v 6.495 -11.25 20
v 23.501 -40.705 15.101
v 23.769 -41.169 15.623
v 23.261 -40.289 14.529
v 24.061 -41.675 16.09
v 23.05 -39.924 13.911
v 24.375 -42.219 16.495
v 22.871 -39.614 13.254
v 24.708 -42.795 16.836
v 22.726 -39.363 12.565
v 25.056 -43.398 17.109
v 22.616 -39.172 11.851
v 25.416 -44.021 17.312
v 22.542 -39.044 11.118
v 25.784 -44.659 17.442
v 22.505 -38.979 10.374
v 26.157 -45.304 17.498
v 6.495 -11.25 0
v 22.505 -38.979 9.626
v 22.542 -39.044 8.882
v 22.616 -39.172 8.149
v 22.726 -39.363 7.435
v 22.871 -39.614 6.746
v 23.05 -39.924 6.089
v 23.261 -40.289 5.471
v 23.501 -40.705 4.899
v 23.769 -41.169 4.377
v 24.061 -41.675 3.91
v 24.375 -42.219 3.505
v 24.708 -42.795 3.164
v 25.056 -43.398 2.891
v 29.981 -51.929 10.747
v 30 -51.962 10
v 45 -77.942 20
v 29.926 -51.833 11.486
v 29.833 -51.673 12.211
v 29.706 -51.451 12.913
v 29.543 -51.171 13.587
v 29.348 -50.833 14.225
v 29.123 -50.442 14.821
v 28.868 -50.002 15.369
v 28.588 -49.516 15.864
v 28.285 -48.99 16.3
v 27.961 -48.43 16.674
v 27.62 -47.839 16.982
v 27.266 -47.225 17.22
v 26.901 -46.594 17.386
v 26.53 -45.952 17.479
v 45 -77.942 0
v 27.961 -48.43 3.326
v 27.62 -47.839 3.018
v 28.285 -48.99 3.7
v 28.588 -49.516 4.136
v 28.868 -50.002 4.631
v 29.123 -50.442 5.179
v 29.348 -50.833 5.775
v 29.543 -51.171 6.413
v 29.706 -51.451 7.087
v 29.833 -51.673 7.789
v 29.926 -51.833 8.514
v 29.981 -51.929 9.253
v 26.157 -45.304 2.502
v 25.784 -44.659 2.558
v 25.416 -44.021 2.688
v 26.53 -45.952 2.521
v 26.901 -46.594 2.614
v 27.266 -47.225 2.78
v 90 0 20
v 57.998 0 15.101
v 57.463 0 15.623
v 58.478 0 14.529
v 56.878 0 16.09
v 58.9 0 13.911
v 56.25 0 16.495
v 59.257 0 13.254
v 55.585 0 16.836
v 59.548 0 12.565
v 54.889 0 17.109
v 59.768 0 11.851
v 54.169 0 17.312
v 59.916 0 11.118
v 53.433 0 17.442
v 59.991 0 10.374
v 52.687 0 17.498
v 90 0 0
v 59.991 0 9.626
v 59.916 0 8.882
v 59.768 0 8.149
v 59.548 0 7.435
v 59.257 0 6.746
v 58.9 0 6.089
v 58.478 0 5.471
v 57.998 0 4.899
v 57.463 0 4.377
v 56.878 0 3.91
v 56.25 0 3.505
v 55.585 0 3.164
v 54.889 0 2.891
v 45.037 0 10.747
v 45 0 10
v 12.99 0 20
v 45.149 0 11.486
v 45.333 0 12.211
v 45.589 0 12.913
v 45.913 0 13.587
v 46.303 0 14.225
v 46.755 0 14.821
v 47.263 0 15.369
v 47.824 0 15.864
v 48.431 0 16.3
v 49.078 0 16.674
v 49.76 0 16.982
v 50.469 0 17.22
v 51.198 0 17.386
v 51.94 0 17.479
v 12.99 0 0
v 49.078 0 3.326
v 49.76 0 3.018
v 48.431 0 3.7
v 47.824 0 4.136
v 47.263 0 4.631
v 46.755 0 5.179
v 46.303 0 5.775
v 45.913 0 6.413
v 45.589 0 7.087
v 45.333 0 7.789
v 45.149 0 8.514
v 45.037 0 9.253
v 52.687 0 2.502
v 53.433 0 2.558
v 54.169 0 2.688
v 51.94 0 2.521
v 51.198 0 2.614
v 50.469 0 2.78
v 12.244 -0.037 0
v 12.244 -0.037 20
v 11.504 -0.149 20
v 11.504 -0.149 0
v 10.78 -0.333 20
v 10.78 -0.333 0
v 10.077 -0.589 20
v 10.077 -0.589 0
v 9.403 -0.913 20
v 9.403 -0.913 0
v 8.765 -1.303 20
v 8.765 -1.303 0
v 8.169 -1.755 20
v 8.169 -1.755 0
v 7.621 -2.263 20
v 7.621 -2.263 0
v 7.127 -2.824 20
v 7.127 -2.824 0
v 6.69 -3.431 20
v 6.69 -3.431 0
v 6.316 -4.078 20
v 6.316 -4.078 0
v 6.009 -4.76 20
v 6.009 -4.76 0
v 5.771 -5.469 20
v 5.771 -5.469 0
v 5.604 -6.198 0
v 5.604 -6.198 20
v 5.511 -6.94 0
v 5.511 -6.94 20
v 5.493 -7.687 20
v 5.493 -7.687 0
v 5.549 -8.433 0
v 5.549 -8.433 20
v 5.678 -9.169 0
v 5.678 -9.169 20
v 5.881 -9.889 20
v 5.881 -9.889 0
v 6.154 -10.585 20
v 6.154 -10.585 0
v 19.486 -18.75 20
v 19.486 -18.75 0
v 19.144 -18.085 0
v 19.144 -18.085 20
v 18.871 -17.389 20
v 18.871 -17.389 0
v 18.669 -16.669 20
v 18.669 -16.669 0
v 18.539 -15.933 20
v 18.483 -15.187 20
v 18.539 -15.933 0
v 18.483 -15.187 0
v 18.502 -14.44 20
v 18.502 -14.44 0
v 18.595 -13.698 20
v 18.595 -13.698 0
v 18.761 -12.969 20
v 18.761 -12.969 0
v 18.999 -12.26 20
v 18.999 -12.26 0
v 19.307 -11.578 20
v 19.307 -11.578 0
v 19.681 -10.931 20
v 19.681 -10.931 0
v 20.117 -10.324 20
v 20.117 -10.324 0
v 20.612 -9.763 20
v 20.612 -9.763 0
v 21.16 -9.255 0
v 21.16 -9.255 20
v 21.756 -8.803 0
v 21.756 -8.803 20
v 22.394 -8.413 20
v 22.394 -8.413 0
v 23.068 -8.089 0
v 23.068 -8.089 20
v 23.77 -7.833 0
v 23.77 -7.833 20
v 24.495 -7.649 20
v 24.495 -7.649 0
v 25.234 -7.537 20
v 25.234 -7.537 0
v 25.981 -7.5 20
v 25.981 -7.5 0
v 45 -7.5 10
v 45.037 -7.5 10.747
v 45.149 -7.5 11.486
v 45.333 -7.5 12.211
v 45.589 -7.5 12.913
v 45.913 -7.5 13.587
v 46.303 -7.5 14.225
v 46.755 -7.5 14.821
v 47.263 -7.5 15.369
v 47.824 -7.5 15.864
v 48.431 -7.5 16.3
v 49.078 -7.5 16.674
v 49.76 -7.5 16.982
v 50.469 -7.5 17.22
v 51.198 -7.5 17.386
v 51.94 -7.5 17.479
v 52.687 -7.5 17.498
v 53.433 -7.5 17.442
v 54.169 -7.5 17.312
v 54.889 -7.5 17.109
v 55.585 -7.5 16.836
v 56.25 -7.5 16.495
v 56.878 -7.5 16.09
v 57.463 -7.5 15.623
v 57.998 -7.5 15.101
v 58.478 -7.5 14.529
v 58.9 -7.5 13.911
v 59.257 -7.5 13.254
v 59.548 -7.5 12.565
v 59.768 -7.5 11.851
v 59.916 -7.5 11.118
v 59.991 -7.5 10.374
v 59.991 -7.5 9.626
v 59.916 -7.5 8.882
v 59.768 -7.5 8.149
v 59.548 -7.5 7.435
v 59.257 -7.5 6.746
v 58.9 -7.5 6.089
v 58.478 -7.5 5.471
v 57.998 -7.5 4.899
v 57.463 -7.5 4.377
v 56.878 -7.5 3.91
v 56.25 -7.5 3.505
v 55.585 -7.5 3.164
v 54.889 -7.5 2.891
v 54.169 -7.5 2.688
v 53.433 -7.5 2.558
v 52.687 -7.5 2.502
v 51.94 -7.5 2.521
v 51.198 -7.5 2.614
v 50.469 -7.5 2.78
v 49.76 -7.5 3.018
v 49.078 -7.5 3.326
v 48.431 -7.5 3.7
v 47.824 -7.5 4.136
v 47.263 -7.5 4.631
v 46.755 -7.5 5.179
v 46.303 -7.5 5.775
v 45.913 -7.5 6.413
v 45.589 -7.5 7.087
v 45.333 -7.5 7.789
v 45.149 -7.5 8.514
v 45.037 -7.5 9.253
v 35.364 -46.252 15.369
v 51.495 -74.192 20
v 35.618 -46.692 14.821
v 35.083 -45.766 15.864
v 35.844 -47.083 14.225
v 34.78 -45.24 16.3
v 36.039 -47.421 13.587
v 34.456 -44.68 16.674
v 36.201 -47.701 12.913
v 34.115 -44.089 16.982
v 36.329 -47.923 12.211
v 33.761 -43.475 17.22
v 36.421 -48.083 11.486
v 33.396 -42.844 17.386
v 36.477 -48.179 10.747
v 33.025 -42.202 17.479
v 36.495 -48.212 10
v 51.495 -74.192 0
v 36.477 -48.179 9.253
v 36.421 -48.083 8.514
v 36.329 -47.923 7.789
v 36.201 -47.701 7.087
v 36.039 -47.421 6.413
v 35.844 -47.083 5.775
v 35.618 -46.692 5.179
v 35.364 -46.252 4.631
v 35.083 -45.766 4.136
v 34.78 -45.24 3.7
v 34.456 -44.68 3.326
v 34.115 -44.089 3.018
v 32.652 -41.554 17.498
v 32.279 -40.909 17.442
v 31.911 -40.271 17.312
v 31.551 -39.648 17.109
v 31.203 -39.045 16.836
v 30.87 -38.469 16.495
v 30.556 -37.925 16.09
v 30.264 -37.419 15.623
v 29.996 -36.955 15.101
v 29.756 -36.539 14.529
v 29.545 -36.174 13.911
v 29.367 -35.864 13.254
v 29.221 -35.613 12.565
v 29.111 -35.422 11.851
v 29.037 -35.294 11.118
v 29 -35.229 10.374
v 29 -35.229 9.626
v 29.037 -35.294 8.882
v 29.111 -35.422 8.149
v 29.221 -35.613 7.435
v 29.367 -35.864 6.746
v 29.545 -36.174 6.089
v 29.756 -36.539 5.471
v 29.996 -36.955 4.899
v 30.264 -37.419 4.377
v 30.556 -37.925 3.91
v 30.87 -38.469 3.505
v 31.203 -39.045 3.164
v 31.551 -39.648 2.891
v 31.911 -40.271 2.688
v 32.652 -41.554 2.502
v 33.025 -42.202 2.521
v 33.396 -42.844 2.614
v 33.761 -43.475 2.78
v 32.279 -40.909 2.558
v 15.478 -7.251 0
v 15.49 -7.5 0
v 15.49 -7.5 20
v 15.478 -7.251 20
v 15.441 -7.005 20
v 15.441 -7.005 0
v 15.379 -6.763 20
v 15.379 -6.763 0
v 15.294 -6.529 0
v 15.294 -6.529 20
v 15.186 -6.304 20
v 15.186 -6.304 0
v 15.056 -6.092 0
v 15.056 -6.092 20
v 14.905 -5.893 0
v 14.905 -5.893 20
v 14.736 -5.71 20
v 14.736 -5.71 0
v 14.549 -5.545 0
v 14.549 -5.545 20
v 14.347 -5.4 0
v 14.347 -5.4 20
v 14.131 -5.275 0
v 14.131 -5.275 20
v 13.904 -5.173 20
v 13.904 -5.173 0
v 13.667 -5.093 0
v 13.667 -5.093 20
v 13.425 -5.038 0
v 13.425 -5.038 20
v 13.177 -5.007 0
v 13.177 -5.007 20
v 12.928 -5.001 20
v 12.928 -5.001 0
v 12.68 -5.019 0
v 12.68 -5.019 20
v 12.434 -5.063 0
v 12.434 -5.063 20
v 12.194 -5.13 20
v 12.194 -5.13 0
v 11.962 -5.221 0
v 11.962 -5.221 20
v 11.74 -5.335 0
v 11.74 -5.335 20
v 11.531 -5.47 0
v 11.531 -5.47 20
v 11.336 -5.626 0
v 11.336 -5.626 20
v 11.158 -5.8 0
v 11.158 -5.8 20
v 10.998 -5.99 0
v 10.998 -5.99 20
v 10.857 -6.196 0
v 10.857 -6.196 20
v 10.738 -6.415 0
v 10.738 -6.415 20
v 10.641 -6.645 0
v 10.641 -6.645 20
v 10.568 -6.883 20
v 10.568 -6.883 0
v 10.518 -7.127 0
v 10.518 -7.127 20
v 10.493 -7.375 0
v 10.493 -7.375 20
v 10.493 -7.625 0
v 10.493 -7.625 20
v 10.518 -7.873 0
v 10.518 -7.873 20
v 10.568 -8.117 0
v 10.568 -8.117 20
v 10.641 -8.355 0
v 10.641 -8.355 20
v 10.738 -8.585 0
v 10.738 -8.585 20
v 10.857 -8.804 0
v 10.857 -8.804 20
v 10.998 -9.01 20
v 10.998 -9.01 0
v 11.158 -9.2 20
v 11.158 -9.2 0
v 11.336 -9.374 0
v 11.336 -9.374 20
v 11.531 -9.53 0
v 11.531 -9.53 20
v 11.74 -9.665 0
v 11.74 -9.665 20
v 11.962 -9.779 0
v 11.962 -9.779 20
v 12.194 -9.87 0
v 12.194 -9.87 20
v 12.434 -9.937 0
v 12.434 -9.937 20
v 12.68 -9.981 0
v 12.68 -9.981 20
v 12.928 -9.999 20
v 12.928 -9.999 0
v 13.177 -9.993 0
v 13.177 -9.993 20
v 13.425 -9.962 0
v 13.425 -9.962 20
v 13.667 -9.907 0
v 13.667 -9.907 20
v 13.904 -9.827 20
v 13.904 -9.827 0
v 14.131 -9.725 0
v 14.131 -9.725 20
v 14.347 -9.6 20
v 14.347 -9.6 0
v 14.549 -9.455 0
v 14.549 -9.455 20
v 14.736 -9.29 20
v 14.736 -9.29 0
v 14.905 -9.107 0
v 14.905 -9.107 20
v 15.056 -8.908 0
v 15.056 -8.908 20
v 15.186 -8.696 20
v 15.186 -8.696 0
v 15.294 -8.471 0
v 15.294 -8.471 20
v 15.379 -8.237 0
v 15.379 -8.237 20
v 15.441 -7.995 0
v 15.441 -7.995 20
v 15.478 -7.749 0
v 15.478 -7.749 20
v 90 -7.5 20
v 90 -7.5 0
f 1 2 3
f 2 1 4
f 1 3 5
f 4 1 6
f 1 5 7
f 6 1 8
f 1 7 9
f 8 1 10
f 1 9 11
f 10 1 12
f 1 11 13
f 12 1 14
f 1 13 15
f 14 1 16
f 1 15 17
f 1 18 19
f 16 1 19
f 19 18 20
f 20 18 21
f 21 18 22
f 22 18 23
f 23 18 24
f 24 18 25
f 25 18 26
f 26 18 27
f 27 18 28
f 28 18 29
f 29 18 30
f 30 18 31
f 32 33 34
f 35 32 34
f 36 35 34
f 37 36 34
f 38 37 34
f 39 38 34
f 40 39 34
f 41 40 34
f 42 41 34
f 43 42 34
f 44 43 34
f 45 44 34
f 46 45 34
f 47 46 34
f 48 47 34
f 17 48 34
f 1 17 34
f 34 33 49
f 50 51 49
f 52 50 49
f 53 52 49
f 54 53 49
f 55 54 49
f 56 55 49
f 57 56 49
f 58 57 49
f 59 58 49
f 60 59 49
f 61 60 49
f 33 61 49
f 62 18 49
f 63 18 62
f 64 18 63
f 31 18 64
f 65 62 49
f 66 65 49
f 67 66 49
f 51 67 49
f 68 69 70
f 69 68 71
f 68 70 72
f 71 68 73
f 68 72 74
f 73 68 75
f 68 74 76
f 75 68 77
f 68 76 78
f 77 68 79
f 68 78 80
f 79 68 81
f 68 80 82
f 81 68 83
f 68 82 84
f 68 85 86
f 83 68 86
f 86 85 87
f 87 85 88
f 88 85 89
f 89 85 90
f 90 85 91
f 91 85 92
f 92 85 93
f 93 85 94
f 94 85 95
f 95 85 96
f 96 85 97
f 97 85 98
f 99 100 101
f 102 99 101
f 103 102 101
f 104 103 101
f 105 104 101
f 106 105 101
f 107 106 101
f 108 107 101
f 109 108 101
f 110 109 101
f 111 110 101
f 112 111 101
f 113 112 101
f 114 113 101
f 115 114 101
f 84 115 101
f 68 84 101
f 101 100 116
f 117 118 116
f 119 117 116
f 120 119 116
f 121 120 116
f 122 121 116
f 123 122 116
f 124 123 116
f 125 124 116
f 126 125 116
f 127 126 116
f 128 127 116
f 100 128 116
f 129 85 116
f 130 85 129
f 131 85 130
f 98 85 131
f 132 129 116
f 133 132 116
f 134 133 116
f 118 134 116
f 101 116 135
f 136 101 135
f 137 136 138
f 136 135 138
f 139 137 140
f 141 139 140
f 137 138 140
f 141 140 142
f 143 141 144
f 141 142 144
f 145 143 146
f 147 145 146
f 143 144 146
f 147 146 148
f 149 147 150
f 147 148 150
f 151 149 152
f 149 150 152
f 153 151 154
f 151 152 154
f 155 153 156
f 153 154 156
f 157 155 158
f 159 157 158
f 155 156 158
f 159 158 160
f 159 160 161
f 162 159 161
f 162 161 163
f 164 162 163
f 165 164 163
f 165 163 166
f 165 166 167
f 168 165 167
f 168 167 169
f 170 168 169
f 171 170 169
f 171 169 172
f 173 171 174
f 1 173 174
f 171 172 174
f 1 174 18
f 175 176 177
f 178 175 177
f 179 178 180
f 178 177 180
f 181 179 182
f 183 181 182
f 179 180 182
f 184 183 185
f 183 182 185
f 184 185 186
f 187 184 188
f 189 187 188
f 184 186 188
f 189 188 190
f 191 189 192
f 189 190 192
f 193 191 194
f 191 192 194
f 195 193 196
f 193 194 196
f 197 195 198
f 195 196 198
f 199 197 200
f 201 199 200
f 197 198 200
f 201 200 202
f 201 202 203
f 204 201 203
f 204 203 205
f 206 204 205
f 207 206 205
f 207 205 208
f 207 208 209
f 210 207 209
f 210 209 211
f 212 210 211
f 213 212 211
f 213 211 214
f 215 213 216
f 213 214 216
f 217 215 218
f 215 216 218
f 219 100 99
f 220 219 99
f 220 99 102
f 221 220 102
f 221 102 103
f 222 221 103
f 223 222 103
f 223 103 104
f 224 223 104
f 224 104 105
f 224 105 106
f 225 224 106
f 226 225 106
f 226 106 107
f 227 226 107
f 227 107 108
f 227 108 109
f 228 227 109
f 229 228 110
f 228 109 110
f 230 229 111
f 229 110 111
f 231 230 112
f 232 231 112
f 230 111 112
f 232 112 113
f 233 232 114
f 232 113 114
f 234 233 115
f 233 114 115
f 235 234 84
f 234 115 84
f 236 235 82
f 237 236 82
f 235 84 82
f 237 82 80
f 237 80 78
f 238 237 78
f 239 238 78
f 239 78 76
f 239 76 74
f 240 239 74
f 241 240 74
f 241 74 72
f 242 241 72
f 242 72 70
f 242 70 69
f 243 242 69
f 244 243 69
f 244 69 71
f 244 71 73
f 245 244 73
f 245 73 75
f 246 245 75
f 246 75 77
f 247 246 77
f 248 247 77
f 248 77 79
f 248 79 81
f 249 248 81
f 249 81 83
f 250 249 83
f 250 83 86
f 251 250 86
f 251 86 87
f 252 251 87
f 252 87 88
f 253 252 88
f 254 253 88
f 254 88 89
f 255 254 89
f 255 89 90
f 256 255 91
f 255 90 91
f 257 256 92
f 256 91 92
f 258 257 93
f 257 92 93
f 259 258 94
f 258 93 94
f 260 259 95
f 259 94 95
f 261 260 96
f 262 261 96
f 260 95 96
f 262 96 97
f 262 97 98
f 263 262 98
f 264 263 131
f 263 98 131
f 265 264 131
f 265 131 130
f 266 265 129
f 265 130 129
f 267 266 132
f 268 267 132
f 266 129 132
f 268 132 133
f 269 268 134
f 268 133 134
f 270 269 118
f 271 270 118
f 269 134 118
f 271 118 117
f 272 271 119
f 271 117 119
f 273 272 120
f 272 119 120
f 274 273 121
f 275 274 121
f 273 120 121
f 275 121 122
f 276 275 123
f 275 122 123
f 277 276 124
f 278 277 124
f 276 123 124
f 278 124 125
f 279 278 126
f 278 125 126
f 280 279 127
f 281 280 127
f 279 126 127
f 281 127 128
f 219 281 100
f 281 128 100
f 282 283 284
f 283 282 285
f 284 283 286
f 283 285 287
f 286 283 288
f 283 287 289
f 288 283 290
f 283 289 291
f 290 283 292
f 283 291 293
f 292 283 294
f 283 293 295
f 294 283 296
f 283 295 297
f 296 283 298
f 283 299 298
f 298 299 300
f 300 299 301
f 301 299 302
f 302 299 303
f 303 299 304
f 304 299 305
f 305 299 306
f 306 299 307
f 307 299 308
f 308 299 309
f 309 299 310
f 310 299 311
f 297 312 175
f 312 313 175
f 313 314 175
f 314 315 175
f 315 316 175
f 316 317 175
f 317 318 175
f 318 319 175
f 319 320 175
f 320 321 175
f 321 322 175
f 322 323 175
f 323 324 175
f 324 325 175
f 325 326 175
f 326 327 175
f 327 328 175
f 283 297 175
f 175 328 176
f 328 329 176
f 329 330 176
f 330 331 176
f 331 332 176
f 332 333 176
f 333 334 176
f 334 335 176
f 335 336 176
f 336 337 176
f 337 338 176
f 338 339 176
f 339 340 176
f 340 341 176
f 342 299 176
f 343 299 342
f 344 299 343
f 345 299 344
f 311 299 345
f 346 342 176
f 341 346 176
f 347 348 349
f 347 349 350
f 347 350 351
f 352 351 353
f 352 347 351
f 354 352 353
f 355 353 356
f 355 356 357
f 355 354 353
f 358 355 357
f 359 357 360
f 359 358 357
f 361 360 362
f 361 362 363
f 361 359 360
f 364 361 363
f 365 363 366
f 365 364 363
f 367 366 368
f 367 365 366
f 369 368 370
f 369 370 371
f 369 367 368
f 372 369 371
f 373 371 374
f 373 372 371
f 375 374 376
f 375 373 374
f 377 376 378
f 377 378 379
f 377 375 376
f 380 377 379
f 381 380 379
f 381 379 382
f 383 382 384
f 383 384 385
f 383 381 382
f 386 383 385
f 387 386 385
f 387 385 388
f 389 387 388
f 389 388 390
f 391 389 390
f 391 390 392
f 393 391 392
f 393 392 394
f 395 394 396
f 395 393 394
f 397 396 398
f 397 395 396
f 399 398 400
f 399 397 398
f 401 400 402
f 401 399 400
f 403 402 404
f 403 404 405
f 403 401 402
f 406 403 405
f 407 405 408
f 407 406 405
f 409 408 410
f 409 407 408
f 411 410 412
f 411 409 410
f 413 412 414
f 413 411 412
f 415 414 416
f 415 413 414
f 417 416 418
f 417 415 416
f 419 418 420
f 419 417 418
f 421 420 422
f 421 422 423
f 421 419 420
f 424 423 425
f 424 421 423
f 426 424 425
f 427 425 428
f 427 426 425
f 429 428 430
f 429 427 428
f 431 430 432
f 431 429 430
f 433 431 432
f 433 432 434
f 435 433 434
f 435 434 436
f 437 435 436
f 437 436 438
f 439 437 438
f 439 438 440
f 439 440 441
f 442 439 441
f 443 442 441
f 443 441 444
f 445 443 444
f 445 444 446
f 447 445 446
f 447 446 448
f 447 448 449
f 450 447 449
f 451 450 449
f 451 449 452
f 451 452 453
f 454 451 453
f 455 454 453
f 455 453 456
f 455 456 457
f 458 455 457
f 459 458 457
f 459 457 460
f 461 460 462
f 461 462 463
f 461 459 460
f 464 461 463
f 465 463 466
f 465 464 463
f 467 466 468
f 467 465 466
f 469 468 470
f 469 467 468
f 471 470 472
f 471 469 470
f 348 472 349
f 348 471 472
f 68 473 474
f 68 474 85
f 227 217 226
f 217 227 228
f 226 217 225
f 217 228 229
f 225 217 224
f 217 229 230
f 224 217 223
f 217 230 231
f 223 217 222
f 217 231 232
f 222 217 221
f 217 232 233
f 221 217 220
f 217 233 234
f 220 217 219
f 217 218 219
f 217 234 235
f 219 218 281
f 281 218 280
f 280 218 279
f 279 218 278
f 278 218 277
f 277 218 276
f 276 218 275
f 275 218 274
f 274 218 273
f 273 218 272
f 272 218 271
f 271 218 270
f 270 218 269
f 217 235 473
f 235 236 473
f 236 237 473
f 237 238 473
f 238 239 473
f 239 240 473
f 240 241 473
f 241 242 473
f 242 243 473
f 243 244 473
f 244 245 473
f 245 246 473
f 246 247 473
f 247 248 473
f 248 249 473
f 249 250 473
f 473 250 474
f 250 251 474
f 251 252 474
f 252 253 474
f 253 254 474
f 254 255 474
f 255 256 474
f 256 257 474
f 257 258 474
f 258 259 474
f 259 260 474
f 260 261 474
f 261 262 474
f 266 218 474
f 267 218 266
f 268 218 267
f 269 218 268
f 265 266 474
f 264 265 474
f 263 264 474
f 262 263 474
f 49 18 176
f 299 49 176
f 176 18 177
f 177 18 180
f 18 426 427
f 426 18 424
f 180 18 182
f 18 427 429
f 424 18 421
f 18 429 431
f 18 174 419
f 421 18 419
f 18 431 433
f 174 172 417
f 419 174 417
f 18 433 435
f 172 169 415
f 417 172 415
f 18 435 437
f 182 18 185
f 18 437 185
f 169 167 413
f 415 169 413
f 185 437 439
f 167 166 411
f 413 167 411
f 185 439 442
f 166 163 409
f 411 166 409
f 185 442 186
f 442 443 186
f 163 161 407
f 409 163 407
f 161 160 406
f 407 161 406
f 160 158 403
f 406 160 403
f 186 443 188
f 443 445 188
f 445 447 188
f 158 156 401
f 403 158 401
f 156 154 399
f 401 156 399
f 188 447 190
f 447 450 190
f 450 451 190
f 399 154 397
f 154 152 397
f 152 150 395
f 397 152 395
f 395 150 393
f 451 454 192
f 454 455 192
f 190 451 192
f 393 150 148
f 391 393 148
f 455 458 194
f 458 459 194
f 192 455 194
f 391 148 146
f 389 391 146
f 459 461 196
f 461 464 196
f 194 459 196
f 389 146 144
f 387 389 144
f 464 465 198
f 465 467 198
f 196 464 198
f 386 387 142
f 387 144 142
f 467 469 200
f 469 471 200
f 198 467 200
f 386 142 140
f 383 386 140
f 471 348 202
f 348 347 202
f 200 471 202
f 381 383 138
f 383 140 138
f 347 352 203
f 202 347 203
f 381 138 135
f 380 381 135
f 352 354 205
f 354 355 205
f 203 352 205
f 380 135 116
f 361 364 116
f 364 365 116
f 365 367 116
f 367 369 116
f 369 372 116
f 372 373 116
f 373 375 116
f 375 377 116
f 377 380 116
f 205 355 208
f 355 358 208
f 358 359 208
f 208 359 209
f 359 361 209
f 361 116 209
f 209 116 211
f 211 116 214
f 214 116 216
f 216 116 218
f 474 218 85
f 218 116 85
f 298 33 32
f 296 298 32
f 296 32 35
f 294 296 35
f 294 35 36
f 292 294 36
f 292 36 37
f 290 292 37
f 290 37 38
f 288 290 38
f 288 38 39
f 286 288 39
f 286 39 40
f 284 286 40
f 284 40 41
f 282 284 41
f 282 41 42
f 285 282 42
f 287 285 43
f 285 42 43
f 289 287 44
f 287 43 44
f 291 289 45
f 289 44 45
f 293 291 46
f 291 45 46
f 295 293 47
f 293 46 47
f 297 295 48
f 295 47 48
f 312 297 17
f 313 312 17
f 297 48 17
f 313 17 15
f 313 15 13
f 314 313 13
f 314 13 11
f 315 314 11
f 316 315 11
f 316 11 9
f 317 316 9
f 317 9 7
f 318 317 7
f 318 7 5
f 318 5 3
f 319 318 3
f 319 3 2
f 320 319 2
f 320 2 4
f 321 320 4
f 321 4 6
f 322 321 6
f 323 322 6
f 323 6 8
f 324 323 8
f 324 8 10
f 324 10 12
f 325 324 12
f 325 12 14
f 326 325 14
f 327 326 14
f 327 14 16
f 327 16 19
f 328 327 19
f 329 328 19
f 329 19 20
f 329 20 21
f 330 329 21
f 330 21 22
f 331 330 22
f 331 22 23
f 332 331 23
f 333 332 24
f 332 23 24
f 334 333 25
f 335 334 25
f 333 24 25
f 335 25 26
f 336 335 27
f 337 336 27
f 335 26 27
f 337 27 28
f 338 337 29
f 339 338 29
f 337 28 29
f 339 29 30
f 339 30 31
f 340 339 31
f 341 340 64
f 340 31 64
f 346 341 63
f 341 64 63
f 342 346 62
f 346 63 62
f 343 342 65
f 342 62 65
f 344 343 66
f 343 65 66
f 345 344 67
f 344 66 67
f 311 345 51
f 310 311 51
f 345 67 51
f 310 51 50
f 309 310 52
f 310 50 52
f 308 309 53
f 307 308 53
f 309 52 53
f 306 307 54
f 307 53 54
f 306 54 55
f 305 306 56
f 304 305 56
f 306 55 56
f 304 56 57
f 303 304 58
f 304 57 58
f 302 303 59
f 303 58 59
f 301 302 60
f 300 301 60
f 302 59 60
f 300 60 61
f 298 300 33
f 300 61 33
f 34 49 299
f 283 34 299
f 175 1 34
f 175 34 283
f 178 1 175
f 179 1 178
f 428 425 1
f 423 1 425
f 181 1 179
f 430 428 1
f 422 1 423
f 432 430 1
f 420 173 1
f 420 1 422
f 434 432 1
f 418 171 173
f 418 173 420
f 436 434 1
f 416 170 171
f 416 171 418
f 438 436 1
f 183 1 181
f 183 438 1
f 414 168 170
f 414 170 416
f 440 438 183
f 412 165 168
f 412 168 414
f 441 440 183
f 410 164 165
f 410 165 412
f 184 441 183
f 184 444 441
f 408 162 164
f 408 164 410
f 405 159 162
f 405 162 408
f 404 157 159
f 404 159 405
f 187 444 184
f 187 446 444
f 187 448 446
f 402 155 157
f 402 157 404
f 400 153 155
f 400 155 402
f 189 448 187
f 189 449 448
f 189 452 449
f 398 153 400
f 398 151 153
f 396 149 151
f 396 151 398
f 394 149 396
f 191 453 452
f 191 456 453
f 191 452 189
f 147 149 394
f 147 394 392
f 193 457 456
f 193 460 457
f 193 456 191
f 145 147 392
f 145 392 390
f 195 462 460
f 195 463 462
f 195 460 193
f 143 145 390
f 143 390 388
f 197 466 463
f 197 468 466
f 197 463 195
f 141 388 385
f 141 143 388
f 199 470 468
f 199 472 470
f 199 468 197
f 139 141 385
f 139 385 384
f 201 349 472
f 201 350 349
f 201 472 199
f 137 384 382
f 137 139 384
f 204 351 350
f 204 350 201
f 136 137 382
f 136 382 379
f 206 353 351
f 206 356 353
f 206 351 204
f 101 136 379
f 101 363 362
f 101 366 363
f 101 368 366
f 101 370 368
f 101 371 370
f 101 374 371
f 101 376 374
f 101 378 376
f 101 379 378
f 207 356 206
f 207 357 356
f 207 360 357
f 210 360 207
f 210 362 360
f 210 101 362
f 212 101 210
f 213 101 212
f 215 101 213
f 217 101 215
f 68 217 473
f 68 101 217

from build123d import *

# Parameters (mm, degrees)
F0_R     = 2.5
F1_DEPTH = 20
F2_R     = 7.5
F3_DEPTH = 25
F4_R     = 7.5
F5_DEPTH = 25


with BuildPart() as f1:
    # F0 (on Top) → F1 (new body)
    with BuildSketch(Plane.XY):
        with BuildLine():
            Line((90, 0), (12.9903810568, 0))
            ThreePointArc((12.9903810568, 0), (6.4951905284, -3.75), (6.4951905284, -11.25))
            Line((6.4951905284, -11.25), (45, -77.9422863406))
            Line((45, -77.9422863406), (51.4951905284, -74.1922863406))
            Line((51.4951905284, -74.1922863406), (19.4855715851, -18.75))
            ThreePointArc((19.4855715851, -18.75), (19.4855715851, -11.25), (25.9807621135, -7.5))
            Line((25.9807621135, -7.5), (90, -7.5))
            Line((90, -7.5), (90, 0))
        make_face()
        with Locations((12.9903810568, -7.5)):
            Circle(F0_R, mode=Mode.SUBTRACT)
    extrude(amount=F1_DEPTH)

    # F2 (on face) → F3 (cut)
    with BuildSketch(Plane(origin=(0, 0, 0), x_dir=(0.5, -0.8660254038, 0), z_dir=(-0.8660254038, -0.5, 0))):
        with Locations((52.5, 10)):
            Circle(F2_R)
    extrude(amount=-F3_DEPTH, mode=Mode.SUBTRACT)

    # F4 (on face) → F5 (cut)
    with BuildSketch(Plane(origin=(0, 0, 0), x_dir=(-1, 0, 0), z_dir=(0, 1, 0))):
        with Locations((-52.5, 10)):
            Circle(F4_R)
    extrude(amount=-F5_DEPTH, mode=Mode.SUBTRACT)


solid = f1.part
